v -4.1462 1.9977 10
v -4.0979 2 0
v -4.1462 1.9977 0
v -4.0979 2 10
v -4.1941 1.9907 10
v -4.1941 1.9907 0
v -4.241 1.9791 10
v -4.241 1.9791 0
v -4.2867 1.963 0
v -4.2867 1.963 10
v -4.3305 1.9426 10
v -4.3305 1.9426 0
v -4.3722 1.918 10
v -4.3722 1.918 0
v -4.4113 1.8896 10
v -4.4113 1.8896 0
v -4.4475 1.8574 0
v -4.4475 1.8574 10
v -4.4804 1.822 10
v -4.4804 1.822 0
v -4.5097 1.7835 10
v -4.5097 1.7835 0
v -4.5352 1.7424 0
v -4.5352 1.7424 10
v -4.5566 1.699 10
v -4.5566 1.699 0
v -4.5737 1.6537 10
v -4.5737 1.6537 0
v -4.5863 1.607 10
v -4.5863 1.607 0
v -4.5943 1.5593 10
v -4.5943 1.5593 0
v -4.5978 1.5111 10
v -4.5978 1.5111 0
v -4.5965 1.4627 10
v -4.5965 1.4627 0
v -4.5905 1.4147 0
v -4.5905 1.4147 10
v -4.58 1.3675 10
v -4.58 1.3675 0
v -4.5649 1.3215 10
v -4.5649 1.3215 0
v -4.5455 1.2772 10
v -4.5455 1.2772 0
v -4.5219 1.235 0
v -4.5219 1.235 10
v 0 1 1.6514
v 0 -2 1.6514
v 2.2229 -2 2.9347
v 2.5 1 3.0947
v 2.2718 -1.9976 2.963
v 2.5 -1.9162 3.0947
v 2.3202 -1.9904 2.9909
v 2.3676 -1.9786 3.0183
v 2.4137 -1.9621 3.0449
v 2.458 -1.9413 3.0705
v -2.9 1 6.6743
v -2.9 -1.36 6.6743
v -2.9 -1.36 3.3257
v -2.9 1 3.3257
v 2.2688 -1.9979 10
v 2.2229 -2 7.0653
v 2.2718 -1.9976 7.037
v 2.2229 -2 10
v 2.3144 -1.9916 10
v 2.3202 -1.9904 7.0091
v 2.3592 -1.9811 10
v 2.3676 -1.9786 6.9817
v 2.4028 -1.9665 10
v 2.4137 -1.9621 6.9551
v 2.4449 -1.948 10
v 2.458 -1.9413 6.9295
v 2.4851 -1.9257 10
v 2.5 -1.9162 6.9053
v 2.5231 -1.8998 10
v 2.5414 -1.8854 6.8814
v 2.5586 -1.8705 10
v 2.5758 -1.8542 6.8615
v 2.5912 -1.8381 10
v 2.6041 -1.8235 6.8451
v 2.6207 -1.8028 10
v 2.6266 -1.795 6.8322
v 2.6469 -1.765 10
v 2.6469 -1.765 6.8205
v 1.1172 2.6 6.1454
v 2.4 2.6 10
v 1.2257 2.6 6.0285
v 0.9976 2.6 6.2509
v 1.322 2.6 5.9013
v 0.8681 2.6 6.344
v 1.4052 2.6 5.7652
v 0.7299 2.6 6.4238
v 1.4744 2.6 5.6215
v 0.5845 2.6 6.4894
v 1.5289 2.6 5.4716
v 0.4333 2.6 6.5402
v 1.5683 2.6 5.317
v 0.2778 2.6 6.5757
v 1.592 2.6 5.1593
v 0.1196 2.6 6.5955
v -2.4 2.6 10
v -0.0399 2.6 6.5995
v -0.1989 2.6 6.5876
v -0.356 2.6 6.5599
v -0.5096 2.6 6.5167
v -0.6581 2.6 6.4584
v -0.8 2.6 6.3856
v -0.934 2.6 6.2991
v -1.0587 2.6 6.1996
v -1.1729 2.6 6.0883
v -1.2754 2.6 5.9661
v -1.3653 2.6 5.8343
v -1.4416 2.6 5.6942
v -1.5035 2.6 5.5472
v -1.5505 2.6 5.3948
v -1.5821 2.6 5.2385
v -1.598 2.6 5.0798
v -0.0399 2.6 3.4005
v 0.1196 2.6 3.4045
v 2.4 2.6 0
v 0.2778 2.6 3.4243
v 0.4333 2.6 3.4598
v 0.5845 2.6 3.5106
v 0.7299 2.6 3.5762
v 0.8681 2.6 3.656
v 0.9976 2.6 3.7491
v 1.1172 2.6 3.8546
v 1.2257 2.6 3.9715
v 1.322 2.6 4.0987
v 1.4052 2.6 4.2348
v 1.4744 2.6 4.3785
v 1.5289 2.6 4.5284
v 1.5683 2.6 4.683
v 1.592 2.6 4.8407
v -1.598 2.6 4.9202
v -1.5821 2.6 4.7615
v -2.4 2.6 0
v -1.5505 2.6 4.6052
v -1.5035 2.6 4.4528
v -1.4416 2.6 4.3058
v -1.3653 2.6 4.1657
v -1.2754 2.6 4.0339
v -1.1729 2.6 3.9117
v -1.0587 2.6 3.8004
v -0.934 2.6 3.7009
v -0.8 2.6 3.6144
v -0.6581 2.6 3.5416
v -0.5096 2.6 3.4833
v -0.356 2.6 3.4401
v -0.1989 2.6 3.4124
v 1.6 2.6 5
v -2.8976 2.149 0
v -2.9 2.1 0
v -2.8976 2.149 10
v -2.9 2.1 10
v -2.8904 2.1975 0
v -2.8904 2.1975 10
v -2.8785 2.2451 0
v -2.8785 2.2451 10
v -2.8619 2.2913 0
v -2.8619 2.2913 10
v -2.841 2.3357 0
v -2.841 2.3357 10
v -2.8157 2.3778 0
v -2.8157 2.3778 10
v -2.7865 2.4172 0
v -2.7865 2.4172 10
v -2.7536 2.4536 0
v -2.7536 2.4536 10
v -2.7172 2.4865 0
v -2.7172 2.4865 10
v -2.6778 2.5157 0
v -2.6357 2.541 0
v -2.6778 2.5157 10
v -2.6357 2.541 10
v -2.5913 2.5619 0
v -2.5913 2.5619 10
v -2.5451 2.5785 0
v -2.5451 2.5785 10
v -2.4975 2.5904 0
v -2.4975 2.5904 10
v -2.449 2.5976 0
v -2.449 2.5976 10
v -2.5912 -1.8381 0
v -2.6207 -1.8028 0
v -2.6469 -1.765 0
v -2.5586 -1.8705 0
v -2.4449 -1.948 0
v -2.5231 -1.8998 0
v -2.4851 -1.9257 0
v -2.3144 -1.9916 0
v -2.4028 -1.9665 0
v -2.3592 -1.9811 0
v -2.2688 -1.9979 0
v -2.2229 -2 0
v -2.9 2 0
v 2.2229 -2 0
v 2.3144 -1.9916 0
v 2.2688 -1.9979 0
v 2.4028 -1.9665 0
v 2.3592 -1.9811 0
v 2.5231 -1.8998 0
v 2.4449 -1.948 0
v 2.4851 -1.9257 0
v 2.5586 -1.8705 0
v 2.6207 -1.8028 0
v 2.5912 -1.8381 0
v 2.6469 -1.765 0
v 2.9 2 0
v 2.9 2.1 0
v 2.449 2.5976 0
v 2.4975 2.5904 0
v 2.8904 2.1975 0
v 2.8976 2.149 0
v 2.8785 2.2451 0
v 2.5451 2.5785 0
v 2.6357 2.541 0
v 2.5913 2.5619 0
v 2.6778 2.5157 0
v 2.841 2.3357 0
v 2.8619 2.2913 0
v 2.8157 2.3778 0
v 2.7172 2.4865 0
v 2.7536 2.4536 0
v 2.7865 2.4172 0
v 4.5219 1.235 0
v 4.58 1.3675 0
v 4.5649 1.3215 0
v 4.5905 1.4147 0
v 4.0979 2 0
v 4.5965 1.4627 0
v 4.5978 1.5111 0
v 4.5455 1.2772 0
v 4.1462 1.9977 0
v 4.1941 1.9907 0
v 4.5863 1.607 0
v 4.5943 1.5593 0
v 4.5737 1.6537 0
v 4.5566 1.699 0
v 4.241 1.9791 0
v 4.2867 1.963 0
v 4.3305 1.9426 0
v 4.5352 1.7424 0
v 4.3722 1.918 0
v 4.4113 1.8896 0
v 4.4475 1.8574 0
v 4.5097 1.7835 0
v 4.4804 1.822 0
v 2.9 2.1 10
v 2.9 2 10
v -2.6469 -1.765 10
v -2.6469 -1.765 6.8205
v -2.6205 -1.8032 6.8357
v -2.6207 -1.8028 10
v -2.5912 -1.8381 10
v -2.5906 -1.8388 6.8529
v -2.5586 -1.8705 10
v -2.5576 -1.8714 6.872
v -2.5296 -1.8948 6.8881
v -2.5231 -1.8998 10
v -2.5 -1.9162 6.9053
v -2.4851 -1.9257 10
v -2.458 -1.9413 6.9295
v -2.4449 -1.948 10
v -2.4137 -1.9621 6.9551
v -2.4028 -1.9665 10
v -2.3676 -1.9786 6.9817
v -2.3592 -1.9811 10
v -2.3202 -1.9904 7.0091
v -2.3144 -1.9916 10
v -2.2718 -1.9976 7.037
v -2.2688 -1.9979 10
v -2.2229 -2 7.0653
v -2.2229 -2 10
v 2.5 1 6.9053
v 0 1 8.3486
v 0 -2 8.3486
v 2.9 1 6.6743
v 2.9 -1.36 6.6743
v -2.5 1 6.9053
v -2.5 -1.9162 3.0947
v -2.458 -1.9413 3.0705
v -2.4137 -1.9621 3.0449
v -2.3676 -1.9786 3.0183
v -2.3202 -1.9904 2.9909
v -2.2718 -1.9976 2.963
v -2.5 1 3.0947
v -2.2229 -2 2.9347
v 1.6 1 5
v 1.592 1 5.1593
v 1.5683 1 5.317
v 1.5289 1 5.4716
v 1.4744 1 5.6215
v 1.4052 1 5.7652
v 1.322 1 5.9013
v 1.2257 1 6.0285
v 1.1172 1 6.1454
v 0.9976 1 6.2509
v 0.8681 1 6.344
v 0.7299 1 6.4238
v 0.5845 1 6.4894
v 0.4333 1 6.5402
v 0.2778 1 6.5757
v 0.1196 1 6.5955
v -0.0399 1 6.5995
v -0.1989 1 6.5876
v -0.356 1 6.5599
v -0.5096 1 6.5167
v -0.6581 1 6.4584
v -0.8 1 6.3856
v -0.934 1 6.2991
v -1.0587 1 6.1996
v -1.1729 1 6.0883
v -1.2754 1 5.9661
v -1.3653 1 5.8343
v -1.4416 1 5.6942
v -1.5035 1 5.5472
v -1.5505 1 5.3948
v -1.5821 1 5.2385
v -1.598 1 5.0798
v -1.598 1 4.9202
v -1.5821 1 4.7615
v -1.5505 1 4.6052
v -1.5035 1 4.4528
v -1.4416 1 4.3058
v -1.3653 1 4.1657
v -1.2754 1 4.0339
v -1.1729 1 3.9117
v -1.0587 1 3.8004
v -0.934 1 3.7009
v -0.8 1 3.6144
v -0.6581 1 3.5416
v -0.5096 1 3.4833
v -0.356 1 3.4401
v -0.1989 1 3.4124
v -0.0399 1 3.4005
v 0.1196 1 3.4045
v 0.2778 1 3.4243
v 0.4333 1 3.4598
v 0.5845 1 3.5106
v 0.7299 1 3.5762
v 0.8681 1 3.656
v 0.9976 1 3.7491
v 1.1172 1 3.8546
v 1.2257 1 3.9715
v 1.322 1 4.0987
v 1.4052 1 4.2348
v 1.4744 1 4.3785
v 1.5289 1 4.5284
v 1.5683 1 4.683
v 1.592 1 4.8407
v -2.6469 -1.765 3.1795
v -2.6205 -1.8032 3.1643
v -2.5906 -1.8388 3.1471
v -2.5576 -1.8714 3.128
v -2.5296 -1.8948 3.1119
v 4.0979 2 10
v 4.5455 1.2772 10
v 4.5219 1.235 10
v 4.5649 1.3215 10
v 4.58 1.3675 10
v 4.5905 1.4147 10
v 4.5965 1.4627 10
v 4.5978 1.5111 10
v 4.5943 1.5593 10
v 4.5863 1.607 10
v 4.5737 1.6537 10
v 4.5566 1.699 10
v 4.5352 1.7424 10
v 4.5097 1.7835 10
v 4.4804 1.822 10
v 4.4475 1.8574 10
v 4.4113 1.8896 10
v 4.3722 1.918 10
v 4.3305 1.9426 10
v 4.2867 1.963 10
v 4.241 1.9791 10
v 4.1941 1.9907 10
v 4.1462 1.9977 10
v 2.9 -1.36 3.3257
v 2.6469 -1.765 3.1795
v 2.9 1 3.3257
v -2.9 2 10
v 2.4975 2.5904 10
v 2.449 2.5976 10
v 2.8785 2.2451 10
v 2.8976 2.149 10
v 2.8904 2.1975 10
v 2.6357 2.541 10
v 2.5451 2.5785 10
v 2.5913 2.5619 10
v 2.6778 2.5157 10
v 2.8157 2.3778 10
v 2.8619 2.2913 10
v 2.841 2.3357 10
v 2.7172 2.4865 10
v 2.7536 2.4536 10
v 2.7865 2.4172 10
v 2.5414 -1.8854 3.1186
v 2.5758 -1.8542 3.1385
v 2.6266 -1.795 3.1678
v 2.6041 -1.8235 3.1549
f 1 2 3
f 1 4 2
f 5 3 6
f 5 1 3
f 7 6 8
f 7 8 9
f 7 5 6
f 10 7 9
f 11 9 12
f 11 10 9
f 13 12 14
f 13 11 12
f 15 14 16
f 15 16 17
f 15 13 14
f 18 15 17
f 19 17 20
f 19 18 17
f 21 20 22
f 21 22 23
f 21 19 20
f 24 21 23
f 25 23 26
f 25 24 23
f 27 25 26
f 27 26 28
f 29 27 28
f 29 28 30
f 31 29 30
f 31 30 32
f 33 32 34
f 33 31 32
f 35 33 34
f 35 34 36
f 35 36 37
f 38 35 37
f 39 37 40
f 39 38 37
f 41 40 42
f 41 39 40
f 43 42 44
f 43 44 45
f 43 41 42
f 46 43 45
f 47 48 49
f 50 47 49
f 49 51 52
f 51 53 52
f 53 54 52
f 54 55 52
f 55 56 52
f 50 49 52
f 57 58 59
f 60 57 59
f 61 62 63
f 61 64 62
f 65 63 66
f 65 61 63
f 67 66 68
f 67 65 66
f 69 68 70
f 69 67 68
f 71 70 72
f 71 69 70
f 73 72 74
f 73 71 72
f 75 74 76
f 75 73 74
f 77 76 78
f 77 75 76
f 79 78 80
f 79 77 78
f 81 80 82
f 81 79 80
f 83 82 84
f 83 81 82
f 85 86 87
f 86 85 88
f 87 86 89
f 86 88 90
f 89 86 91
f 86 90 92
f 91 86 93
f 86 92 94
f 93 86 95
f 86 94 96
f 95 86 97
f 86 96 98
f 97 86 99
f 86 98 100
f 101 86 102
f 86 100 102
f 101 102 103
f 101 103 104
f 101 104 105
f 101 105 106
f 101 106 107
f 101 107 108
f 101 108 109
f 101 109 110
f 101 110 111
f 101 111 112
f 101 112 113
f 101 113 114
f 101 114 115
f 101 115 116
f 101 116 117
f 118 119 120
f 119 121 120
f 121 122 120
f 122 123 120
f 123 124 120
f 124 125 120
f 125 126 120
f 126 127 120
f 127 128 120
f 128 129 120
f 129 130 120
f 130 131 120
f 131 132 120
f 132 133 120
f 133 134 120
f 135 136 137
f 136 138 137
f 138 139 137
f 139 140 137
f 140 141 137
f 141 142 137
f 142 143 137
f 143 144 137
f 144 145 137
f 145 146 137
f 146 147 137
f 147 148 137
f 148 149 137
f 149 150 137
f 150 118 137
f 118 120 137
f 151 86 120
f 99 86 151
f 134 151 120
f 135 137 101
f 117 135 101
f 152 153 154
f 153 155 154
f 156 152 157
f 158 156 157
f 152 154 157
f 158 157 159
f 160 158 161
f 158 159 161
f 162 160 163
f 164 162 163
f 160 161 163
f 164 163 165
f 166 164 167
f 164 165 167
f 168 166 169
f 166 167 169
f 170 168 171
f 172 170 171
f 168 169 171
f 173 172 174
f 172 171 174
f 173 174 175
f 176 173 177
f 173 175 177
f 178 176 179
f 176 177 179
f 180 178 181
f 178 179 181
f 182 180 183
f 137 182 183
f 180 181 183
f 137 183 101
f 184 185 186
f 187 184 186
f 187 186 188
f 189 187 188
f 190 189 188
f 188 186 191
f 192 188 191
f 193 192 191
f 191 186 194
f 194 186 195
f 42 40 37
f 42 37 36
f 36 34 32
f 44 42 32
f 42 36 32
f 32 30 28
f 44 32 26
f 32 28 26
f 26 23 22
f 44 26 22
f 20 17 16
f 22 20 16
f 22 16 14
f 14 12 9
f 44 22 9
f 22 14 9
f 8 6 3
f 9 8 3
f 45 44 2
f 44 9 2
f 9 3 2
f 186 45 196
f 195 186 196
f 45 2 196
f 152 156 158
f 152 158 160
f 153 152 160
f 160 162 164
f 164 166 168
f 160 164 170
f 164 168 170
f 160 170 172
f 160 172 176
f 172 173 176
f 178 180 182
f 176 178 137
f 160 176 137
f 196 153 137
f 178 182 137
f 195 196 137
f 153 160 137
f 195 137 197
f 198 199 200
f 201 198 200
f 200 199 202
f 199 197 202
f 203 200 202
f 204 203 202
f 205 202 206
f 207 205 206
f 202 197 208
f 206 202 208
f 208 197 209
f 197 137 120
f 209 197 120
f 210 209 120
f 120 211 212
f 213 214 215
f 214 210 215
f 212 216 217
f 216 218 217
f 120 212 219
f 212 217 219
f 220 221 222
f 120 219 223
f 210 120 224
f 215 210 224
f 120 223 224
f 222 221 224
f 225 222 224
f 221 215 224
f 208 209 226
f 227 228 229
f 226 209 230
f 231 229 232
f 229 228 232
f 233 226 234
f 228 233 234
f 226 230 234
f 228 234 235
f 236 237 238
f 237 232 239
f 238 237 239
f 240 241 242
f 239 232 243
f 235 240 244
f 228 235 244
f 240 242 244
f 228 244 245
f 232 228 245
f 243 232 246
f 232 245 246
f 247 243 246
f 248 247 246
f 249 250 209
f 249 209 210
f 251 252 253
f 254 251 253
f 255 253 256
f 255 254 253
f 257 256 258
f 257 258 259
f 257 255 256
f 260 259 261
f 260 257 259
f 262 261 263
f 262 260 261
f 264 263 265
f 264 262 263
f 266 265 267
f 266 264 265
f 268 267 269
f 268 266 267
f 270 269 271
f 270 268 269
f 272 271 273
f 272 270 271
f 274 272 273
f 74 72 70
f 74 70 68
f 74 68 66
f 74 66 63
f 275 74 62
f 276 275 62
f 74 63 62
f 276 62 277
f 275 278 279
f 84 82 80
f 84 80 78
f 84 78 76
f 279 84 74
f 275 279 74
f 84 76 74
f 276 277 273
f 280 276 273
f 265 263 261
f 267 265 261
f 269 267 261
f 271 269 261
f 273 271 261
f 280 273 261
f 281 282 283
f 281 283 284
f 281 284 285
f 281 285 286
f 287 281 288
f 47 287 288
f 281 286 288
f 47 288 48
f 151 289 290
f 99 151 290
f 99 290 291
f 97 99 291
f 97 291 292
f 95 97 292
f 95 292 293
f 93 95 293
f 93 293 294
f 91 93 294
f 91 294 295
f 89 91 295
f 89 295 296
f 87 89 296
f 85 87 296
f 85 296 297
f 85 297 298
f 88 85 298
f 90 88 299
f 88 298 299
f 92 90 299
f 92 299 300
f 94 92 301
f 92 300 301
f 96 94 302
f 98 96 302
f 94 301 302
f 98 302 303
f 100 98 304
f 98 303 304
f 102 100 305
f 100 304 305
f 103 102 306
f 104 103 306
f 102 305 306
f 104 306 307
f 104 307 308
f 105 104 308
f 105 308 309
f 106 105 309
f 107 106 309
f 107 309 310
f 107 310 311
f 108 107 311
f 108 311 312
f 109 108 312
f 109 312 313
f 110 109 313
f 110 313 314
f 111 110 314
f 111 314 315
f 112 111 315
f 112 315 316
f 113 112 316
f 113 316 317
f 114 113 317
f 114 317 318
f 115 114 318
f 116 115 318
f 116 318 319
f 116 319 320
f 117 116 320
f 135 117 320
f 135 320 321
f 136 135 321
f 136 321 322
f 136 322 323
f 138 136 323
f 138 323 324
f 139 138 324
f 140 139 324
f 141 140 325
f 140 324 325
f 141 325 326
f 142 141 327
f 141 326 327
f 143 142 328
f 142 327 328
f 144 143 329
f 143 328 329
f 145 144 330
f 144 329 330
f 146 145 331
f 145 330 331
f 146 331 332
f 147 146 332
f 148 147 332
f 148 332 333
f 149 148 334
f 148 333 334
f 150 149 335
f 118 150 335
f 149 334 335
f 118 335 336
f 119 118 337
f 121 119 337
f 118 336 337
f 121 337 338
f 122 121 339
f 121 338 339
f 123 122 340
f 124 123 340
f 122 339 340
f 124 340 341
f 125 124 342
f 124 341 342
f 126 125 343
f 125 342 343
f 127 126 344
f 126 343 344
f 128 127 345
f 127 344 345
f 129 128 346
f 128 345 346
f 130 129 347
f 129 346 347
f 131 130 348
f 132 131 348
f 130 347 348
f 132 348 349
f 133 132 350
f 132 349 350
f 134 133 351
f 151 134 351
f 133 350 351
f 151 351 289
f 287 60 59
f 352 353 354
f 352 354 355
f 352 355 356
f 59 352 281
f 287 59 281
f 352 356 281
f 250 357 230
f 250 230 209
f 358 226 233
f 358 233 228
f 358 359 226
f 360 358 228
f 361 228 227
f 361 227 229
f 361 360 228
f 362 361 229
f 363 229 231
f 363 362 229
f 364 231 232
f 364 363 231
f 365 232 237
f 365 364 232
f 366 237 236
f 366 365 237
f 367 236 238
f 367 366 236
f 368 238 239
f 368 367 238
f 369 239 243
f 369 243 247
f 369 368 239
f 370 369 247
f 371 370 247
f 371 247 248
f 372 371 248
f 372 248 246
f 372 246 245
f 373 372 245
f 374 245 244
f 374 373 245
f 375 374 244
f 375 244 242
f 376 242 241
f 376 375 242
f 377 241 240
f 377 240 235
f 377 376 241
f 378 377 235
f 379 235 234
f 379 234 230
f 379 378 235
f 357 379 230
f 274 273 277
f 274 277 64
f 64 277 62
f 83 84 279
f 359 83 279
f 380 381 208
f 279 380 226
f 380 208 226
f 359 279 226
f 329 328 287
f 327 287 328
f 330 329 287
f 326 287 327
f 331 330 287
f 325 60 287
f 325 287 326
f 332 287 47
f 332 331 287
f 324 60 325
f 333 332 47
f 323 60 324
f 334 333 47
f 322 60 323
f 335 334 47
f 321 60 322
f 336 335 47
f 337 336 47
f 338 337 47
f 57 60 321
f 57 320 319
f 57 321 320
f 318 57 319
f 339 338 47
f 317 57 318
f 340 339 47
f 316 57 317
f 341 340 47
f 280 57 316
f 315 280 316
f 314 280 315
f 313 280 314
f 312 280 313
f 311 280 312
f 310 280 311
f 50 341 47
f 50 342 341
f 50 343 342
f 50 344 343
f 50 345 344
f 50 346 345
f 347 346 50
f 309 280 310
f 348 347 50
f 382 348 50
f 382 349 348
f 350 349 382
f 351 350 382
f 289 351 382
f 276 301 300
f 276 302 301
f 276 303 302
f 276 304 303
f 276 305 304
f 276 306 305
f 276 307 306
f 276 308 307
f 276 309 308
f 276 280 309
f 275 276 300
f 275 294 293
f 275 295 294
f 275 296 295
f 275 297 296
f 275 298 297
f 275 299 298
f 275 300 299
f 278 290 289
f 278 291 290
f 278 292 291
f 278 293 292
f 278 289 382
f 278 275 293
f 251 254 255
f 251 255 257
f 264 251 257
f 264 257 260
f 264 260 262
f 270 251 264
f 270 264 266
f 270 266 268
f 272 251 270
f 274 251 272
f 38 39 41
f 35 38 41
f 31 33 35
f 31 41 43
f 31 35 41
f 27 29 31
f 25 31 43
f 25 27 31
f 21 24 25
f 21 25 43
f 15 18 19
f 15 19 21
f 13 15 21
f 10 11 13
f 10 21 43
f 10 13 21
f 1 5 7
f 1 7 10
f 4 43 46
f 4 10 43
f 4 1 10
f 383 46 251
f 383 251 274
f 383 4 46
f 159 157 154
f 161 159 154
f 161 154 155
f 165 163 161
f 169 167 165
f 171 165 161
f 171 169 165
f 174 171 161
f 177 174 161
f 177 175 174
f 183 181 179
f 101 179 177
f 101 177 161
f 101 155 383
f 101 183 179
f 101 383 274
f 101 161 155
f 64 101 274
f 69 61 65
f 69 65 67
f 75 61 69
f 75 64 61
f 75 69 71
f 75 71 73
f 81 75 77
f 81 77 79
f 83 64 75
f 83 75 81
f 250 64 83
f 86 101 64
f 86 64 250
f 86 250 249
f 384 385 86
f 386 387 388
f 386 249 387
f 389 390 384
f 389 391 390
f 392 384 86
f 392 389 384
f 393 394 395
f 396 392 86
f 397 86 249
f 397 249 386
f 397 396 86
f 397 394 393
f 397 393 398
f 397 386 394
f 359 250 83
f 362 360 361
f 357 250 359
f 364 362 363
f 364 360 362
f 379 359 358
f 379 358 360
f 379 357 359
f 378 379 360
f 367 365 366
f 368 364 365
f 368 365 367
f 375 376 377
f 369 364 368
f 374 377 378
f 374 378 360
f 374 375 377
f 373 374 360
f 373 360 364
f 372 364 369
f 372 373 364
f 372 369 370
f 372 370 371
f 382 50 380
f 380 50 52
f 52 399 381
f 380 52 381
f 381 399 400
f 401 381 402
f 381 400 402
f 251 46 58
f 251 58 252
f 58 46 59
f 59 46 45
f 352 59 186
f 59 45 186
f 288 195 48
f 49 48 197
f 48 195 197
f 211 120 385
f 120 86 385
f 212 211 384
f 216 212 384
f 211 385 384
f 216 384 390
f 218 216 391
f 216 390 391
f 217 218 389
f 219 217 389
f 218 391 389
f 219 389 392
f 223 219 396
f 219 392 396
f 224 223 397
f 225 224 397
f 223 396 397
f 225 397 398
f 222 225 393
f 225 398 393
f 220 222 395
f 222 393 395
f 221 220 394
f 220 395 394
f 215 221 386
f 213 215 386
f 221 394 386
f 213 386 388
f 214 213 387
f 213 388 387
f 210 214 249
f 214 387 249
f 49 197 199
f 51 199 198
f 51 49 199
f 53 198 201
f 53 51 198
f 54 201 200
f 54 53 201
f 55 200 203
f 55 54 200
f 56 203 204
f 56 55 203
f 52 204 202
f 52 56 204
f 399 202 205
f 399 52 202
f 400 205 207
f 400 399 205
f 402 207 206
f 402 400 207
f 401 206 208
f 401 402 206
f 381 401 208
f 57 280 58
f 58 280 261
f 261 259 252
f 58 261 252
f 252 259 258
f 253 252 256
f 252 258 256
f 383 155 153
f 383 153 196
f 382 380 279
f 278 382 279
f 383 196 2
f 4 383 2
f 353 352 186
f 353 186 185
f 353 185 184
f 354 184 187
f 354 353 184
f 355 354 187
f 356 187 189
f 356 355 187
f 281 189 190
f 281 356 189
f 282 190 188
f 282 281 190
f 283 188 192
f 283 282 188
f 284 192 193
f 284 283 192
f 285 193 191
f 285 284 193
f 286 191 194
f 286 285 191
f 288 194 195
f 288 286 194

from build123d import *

# Parameters (mm, degrees)
F1_DEPTH = 10
F2_R     = 1.6
F3_DEPTH = 4.601
F4_DEPTH = 3
F5_R     = 0.5


with BuildPart() as f1:
    # F0 (on Top) → F1 (new body)
    with BuildSketch(Plane.XY):
        Polygon((-2.9, 2), (-5, 2), (-2.5, -2), (2.5, -2), (5, 2), (2.9, 2), (2.9, 2.6), (-2.9, 2.6), align=None)
    extrude(amount=F1_DEPTH)

    # F2 (on face) → F3 (cut, through all)
    with BuildSketch(Plane.XZ.offset(2)):
        with Locations((0, 5)):
            Circle(F2_R)
    extrude(amount=-F3_DEPTH, mode=Mode.SUBTRACT)

    # F2 (on face) → F4 (cut)
    with BuildSketch(Plane.XZ.offset(2)):
        Polygon((0, 1.651368), (2.5, 3.094744), (2.5, 6.905256), (0, 8.348632), (-2.5, 6.905256), (-2.5, 3.094744), align=None)
        with Locations((0, 5)):
            Circle(F2_R, mode=Mode.SUBTRACT)
        Polygon((2.5, 3.094744), (2.9, 3.325684), (2.9, 6.674316), (2.5, 6.905256), align=None)
        Polygon((-2.9, 3.325684), (-2.5, 3.094744), (-2.5, 6.905256), (-2.9, 6.674316), align=None)
    extrude(amount=-F4_DEPTH, mode=Mode.SUBTRACT)

    # F5
    f5_edges = [f1.edges().sort_by_distance(p)[0] for p in [
        (-5, 2, 5),
        (-2.5, -2, 1.547372),
        (-2.5, -2, 8.452628),
        (2.5, -2, 1.547372),
        (2.5, -2, 8.452628),
        (5, 2, 5),
        (-2.9, 2.6, 5),
        (2.9, 2.6, 5),
    ]]
    fillet(f5_edges, radius=F5_R)


solid = f1.part
